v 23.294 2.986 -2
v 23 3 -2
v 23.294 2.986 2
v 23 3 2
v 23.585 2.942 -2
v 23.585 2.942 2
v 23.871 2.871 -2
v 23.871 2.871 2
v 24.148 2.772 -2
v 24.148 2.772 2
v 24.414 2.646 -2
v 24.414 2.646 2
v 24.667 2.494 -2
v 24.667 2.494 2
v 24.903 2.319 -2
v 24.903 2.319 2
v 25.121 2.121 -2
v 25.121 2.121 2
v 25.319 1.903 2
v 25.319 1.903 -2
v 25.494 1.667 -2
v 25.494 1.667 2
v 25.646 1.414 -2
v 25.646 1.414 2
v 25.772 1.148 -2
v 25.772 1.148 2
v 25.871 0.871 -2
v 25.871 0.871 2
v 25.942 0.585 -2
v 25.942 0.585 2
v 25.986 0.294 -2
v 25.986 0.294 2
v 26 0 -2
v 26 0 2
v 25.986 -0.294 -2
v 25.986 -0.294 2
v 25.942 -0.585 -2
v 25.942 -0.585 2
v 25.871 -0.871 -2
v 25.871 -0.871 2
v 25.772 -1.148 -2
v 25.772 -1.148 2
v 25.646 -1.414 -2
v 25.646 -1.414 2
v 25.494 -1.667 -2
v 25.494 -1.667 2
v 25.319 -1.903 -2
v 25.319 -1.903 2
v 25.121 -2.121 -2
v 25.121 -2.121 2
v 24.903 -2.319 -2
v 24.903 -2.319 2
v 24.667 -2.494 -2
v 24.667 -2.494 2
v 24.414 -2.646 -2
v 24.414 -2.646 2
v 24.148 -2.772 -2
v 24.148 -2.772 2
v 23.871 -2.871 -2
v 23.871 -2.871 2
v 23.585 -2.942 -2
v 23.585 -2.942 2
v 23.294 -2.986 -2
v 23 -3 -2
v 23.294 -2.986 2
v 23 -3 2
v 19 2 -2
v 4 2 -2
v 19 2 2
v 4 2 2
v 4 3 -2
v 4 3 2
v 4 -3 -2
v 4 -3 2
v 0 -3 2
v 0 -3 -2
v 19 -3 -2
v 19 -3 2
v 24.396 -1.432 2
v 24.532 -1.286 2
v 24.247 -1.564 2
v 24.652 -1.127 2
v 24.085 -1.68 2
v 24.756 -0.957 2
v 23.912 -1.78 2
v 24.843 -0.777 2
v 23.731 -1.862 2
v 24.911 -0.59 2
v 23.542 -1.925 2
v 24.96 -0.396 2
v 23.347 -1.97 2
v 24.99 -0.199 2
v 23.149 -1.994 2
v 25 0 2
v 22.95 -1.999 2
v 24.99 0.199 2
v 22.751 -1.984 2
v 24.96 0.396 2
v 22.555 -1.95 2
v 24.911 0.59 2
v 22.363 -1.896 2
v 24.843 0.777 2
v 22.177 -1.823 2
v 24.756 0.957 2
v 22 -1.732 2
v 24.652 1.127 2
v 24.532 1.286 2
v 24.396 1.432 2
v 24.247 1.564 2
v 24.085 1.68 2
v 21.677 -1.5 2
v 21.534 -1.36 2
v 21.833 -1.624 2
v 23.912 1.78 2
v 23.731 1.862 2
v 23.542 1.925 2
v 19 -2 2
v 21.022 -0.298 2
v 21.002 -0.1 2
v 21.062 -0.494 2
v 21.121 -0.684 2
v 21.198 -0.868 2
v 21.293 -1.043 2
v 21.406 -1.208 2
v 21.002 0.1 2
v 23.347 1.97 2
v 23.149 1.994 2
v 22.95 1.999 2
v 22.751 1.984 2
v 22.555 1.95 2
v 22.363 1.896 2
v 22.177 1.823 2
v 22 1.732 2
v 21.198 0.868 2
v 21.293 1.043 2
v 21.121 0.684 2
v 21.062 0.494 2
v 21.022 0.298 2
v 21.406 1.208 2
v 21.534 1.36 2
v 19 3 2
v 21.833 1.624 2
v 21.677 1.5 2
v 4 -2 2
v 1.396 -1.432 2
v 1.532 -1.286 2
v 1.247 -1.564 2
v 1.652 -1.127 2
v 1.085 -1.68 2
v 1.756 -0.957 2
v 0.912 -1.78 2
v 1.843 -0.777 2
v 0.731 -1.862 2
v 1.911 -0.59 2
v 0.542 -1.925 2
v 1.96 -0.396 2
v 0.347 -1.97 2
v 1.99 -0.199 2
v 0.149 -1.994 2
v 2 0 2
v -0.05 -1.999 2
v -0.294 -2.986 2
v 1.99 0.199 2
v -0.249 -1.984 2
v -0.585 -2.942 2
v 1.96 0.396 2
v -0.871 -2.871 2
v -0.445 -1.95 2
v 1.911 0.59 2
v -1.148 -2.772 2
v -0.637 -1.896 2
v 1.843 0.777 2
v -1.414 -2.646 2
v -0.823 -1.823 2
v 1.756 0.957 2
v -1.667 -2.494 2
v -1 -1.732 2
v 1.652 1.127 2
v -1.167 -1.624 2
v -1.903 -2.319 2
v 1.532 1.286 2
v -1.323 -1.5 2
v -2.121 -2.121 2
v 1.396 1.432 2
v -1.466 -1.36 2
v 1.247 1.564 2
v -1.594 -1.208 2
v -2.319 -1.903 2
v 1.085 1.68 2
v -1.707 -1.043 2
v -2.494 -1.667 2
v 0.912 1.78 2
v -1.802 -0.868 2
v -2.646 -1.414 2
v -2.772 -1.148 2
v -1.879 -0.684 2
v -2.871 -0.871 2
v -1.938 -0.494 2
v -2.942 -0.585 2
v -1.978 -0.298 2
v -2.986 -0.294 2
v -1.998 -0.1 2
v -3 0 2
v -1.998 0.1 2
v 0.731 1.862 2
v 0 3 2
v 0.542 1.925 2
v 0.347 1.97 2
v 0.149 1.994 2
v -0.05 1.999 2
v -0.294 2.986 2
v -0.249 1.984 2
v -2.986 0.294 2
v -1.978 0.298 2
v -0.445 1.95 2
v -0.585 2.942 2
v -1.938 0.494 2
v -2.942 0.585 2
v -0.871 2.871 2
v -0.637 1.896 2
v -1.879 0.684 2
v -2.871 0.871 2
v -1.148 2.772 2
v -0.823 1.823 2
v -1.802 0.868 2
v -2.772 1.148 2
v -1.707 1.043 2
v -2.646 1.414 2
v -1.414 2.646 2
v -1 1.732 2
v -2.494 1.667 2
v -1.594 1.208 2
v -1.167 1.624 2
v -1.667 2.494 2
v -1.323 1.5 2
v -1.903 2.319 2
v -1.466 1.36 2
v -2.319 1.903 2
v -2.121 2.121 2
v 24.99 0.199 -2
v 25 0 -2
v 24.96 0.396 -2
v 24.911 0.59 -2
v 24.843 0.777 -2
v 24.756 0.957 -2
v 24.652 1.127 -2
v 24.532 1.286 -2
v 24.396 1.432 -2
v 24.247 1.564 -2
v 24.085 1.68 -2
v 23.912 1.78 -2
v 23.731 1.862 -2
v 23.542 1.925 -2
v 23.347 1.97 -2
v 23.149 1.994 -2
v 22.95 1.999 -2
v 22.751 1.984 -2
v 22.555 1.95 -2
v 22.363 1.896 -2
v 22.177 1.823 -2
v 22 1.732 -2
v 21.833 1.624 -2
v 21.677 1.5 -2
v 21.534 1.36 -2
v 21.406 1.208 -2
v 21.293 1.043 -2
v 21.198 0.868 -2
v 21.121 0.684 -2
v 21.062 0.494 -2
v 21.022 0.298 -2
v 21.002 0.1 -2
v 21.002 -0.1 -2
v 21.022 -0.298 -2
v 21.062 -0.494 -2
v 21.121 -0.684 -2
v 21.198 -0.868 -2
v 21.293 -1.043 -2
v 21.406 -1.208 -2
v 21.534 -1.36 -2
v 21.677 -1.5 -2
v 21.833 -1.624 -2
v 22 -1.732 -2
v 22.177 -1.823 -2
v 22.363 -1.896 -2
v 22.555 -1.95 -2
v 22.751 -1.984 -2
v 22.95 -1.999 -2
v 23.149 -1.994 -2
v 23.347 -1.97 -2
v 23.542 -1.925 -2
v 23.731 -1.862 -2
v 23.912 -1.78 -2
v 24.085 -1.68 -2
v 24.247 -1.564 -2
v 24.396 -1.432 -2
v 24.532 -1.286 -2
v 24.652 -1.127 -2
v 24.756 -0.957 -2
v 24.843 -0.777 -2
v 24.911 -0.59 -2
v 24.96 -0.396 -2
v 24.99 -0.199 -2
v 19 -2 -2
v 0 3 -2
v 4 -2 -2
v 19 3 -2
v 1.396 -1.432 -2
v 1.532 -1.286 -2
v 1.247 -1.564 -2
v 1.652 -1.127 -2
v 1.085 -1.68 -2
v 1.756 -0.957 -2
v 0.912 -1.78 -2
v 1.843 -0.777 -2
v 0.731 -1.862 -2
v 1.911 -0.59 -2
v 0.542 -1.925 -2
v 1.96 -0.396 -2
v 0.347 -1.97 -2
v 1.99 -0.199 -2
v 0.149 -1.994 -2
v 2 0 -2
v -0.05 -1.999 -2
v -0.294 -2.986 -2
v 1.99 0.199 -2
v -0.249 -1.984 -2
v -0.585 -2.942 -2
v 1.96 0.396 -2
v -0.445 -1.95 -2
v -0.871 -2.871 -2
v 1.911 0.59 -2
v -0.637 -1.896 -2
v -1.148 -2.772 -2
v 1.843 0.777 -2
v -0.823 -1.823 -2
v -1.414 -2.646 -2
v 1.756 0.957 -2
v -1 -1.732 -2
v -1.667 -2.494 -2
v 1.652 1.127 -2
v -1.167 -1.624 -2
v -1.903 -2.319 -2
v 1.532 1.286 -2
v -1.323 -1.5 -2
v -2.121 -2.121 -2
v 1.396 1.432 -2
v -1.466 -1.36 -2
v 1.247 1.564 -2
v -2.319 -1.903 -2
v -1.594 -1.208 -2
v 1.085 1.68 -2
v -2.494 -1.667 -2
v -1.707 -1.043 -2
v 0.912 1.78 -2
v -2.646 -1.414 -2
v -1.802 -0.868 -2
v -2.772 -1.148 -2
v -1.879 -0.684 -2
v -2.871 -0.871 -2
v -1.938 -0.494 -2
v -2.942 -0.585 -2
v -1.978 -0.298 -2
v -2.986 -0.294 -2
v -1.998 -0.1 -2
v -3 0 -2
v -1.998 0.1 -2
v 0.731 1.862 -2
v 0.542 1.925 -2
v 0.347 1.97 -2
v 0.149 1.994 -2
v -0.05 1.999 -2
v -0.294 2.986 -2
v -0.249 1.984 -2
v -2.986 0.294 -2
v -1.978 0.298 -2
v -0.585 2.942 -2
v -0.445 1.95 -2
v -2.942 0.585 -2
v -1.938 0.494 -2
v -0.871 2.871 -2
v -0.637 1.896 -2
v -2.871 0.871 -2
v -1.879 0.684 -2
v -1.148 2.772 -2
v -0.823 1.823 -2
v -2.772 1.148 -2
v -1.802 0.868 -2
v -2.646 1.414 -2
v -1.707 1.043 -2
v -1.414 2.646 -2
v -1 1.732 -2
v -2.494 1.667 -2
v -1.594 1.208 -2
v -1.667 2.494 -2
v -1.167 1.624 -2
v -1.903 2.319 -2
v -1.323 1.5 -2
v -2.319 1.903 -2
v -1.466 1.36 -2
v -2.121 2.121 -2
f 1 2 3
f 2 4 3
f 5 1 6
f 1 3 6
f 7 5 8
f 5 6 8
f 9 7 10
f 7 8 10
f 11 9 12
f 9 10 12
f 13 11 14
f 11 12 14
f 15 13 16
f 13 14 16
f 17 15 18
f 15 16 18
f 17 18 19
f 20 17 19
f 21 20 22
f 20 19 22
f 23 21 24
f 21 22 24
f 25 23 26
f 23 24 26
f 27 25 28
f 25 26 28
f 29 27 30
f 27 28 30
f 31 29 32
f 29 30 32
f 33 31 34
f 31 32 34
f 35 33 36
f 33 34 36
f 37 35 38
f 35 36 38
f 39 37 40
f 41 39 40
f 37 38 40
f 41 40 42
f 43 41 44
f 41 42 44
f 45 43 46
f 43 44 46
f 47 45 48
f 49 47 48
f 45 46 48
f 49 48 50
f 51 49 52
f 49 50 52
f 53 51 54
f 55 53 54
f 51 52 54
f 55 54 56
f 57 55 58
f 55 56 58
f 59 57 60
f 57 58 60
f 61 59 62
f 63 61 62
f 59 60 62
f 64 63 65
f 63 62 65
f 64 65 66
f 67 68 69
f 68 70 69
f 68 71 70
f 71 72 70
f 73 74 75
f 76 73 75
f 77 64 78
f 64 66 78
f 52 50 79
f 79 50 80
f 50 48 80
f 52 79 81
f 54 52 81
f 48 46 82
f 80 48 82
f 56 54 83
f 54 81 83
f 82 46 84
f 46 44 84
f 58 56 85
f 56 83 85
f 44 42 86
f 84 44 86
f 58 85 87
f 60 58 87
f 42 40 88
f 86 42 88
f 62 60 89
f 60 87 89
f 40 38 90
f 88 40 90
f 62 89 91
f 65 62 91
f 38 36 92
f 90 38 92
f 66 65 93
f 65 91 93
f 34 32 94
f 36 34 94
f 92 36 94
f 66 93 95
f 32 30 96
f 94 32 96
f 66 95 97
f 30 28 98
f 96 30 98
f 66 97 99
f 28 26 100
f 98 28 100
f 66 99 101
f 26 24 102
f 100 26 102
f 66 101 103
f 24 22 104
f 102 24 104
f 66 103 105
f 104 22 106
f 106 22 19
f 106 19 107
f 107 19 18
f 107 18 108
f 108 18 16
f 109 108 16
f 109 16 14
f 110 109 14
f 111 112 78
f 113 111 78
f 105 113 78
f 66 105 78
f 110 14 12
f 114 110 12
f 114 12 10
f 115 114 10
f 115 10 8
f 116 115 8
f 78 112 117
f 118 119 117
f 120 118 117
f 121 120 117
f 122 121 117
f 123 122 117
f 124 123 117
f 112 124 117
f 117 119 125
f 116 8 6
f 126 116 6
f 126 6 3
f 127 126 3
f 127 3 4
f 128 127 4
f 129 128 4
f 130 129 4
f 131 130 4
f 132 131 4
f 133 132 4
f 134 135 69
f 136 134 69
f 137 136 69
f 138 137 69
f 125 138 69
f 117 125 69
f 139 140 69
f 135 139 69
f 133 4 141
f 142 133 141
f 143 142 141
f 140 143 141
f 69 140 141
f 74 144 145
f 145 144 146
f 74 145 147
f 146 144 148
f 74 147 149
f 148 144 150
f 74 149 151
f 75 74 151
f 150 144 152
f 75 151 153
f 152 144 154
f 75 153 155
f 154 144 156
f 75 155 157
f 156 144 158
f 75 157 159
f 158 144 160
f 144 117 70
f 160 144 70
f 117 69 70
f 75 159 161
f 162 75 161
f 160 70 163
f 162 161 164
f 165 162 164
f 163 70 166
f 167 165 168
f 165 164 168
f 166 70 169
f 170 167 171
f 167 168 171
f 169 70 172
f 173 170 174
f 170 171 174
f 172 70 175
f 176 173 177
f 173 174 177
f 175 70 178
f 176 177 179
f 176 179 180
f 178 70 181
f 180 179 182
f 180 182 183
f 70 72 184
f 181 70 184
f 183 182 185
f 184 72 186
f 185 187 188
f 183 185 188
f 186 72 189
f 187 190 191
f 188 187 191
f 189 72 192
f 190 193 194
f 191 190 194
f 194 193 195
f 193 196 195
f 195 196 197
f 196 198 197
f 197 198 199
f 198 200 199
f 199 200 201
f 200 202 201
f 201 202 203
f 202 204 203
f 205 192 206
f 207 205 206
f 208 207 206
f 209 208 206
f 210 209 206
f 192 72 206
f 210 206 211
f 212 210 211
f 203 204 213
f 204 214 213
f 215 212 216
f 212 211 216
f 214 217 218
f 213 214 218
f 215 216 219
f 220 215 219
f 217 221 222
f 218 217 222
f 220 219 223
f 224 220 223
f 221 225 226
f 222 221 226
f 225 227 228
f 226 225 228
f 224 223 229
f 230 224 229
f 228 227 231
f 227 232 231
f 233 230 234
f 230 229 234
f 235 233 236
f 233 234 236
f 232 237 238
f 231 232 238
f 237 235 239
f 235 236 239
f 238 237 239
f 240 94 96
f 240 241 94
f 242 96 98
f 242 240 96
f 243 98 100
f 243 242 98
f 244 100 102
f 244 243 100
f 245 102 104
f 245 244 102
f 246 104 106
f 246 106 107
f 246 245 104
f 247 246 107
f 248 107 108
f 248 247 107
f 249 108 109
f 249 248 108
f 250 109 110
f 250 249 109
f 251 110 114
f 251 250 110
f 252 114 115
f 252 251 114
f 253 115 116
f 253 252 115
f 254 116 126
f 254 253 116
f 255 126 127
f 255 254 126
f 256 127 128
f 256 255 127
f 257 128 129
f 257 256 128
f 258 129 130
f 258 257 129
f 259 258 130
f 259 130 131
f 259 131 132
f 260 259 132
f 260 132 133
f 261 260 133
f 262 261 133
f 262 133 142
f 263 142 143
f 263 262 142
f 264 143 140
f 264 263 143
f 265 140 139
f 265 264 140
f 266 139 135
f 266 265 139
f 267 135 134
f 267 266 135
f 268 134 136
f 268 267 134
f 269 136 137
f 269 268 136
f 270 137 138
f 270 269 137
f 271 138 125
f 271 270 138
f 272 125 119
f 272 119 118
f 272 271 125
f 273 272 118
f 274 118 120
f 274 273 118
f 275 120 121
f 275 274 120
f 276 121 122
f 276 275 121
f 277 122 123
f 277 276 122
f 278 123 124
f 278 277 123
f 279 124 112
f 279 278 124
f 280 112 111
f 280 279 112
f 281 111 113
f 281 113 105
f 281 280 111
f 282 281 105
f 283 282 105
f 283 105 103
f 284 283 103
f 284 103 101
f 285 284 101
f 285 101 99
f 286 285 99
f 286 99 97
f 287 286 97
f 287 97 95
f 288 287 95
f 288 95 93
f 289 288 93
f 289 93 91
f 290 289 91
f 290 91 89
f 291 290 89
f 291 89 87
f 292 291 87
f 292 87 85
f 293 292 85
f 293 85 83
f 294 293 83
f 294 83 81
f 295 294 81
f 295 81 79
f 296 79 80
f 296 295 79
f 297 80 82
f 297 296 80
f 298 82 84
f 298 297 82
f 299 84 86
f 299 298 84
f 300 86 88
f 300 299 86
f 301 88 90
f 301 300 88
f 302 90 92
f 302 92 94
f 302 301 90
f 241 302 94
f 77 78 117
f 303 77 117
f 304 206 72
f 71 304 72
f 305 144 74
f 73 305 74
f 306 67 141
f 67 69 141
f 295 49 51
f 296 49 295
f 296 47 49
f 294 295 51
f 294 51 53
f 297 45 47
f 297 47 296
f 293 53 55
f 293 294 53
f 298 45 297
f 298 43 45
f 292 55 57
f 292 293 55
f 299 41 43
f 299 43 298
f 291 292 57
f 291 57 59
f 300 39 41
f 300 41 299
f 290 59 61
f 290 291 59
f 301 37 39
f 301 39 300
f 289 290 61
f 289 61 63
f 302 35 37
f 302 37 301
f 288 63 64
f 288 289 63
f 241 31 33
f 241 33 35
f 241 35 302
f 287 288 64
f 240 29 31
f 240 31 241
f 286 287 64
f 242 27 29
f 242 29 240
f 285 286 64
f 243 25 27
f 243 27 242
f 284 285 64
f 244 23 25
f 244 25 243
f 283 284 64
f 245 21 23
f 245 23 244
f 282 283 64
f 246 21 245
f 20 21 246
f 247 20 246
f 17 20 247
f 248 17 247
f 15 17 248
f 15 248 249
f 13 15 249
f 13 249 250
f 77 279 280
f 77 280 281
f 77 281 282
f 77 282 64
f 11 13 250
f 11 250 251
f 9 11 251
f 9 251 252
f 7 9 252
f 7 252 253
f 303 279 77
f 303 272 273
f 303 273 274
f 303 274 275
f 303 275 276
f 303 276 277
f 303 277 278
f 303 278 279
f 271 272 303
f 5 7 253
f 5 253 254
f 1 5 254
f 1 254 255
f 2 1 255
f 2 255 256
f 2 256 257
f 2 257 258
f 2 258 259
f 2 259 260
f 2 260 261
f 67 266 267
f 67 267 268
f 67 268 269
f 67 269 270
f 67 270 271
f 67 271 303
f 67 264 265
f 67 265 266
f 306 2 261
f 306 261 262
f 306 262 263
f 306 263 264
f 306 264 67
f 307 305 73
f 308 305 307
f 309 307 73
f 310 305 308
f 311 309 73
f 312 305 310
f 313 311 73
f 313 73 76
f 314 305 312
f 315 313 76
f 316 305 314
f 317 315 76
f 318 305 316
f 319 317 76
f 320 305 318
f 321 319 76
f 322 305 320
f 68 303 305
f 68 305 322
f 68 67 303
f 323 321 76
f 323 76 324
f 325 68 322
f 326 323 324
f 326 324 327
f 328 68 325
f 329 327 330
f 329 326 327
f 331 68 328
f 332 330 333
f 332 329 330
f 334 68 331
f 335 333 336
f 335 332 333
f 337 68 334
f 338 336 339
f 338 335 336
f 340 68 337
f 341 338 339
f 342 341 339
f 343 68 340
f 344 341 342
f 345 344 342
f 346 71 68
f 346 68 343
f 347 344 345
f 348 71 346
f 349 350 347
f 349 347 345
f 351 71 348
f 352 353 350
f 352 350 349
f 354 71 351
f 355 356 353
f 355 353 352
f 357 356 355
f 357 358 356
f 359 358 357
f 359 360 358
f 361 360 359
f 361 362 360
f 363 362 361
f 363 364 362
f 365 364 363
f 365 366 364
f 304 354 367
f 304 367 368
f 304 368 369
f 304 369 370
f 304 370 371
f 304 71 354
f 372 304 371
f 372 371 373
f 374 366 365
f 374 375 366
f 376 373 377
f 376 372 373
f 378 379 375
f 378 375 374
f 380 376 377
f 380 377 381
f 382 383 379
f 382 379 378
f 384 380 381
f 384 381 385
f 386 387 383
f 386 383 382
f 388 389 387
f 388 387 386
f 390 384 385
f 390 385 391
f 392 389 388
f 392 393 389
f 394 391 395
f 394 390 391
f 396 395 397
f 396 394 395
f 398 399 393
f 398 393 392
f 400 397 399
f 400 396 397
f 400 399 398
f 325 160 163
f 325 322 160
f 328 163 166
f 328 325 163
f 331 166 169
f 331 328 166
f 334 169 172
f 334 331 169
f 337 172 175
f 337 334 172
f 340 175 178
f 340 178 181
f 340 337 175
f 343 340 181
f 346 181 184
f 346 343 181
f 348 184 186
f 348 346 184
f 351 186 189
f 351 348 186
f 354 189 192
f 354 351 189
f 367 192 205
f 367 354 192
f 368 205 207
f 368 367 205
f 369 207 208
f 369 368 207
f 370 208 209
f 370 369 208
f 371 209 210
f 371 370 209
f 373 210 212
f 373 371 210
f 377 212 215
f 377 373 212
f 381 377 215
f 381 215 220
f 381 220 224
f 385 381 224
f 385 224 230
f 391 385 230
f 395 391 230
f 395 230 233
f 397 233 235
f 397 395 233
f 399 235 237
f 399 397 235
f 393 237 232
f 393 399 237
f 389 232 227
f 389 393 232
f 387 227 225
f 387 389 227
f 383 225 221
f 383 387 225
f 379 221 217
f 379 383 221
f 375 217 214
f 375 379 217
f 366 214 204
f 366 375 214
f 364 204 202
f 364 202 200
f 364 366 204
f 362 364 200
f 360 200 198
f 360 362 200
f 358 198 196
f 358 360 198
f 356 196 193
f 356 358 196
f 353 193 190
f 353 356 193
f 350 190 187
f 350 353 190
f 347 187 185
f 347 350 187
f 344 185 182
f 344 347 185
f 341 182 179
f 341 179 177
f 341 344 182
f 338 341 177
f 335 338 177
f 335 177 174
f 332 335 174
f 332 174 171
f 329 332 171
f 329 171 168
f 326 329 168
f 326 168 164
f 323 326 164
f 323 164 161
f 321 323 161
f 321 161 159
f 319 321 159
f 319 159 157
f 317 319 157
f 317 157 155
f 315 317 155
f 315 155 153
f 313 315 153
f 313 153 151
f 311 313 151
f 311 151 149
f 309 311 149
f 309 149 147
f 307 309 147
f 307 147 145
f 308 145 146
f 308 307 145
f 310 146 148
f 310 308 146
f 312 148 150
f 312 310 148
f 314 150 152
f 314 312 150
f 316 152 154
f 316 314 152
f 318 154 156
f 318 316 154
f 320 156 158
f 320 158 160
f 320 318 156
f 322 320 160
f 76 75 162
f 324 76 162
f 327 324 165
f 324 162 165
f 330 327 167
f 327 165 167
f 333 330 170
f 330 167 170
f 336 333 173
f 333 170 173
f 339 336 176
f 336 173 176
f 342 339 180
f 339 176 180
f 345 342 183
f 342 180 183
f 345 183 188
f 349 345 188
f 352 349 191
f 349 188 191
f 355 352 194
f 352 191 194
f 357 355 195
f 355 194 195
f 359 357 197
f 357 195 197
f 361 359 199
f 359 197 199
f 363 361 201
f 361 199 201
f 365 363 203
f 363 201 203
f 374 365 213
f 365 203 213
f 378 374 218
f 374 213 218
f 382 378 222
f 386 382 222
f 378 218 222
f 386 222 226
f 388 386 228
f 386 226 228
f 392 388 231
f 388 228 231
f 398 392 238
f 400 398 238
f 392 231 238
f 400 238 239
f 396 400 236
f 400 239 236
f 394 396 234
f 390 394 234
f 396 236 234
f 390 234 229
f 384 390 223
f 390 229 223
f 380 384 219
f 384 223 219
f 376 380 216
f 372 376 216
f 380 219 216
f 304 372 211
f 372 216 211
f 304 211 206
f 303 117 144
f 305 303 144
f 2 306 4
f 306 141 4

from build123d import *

# Parameters (mm, degrees)
SKETCH_1_R      = 2
EXTRUDE_1_DEPTH = 2


with BuildPart() as part:
    # 草图1 → 凸台-拉伸1 (new, symmetric)
    with BuildSketch(Plane.XY):
        with BuildLine():
            Line((0, 3), (4, 3))
            Line((4, 3), (4, 2))
            Line((4, 2), (19, 2))
            Line((19, 2), (19, 3))
            Line((19, 3), (23, 3))
            ThreePointArc((23, 3), (26, 0), (23, -3))
            Line((23, -3), (19, -3))
            Line((19, -3), (19, -2))
            Line((19, -2), (4, -2))
            Line((4, -2), (4, -3))
            Line((4, -3), (0, -3))
            ThreePointArc((0, -3), (-3, 0), (0, 3))
        make_face()
        Circle(SKETCH_1_R, mode=Mode.SUBTRACT)
        with Locations((23, 0)):
            Circle(SKETCH_1_R, mode=Mode.SUBTRACT)
    extrude(amount=EXTRUDE_1_DEPTH, both=True)


solid = part.part
